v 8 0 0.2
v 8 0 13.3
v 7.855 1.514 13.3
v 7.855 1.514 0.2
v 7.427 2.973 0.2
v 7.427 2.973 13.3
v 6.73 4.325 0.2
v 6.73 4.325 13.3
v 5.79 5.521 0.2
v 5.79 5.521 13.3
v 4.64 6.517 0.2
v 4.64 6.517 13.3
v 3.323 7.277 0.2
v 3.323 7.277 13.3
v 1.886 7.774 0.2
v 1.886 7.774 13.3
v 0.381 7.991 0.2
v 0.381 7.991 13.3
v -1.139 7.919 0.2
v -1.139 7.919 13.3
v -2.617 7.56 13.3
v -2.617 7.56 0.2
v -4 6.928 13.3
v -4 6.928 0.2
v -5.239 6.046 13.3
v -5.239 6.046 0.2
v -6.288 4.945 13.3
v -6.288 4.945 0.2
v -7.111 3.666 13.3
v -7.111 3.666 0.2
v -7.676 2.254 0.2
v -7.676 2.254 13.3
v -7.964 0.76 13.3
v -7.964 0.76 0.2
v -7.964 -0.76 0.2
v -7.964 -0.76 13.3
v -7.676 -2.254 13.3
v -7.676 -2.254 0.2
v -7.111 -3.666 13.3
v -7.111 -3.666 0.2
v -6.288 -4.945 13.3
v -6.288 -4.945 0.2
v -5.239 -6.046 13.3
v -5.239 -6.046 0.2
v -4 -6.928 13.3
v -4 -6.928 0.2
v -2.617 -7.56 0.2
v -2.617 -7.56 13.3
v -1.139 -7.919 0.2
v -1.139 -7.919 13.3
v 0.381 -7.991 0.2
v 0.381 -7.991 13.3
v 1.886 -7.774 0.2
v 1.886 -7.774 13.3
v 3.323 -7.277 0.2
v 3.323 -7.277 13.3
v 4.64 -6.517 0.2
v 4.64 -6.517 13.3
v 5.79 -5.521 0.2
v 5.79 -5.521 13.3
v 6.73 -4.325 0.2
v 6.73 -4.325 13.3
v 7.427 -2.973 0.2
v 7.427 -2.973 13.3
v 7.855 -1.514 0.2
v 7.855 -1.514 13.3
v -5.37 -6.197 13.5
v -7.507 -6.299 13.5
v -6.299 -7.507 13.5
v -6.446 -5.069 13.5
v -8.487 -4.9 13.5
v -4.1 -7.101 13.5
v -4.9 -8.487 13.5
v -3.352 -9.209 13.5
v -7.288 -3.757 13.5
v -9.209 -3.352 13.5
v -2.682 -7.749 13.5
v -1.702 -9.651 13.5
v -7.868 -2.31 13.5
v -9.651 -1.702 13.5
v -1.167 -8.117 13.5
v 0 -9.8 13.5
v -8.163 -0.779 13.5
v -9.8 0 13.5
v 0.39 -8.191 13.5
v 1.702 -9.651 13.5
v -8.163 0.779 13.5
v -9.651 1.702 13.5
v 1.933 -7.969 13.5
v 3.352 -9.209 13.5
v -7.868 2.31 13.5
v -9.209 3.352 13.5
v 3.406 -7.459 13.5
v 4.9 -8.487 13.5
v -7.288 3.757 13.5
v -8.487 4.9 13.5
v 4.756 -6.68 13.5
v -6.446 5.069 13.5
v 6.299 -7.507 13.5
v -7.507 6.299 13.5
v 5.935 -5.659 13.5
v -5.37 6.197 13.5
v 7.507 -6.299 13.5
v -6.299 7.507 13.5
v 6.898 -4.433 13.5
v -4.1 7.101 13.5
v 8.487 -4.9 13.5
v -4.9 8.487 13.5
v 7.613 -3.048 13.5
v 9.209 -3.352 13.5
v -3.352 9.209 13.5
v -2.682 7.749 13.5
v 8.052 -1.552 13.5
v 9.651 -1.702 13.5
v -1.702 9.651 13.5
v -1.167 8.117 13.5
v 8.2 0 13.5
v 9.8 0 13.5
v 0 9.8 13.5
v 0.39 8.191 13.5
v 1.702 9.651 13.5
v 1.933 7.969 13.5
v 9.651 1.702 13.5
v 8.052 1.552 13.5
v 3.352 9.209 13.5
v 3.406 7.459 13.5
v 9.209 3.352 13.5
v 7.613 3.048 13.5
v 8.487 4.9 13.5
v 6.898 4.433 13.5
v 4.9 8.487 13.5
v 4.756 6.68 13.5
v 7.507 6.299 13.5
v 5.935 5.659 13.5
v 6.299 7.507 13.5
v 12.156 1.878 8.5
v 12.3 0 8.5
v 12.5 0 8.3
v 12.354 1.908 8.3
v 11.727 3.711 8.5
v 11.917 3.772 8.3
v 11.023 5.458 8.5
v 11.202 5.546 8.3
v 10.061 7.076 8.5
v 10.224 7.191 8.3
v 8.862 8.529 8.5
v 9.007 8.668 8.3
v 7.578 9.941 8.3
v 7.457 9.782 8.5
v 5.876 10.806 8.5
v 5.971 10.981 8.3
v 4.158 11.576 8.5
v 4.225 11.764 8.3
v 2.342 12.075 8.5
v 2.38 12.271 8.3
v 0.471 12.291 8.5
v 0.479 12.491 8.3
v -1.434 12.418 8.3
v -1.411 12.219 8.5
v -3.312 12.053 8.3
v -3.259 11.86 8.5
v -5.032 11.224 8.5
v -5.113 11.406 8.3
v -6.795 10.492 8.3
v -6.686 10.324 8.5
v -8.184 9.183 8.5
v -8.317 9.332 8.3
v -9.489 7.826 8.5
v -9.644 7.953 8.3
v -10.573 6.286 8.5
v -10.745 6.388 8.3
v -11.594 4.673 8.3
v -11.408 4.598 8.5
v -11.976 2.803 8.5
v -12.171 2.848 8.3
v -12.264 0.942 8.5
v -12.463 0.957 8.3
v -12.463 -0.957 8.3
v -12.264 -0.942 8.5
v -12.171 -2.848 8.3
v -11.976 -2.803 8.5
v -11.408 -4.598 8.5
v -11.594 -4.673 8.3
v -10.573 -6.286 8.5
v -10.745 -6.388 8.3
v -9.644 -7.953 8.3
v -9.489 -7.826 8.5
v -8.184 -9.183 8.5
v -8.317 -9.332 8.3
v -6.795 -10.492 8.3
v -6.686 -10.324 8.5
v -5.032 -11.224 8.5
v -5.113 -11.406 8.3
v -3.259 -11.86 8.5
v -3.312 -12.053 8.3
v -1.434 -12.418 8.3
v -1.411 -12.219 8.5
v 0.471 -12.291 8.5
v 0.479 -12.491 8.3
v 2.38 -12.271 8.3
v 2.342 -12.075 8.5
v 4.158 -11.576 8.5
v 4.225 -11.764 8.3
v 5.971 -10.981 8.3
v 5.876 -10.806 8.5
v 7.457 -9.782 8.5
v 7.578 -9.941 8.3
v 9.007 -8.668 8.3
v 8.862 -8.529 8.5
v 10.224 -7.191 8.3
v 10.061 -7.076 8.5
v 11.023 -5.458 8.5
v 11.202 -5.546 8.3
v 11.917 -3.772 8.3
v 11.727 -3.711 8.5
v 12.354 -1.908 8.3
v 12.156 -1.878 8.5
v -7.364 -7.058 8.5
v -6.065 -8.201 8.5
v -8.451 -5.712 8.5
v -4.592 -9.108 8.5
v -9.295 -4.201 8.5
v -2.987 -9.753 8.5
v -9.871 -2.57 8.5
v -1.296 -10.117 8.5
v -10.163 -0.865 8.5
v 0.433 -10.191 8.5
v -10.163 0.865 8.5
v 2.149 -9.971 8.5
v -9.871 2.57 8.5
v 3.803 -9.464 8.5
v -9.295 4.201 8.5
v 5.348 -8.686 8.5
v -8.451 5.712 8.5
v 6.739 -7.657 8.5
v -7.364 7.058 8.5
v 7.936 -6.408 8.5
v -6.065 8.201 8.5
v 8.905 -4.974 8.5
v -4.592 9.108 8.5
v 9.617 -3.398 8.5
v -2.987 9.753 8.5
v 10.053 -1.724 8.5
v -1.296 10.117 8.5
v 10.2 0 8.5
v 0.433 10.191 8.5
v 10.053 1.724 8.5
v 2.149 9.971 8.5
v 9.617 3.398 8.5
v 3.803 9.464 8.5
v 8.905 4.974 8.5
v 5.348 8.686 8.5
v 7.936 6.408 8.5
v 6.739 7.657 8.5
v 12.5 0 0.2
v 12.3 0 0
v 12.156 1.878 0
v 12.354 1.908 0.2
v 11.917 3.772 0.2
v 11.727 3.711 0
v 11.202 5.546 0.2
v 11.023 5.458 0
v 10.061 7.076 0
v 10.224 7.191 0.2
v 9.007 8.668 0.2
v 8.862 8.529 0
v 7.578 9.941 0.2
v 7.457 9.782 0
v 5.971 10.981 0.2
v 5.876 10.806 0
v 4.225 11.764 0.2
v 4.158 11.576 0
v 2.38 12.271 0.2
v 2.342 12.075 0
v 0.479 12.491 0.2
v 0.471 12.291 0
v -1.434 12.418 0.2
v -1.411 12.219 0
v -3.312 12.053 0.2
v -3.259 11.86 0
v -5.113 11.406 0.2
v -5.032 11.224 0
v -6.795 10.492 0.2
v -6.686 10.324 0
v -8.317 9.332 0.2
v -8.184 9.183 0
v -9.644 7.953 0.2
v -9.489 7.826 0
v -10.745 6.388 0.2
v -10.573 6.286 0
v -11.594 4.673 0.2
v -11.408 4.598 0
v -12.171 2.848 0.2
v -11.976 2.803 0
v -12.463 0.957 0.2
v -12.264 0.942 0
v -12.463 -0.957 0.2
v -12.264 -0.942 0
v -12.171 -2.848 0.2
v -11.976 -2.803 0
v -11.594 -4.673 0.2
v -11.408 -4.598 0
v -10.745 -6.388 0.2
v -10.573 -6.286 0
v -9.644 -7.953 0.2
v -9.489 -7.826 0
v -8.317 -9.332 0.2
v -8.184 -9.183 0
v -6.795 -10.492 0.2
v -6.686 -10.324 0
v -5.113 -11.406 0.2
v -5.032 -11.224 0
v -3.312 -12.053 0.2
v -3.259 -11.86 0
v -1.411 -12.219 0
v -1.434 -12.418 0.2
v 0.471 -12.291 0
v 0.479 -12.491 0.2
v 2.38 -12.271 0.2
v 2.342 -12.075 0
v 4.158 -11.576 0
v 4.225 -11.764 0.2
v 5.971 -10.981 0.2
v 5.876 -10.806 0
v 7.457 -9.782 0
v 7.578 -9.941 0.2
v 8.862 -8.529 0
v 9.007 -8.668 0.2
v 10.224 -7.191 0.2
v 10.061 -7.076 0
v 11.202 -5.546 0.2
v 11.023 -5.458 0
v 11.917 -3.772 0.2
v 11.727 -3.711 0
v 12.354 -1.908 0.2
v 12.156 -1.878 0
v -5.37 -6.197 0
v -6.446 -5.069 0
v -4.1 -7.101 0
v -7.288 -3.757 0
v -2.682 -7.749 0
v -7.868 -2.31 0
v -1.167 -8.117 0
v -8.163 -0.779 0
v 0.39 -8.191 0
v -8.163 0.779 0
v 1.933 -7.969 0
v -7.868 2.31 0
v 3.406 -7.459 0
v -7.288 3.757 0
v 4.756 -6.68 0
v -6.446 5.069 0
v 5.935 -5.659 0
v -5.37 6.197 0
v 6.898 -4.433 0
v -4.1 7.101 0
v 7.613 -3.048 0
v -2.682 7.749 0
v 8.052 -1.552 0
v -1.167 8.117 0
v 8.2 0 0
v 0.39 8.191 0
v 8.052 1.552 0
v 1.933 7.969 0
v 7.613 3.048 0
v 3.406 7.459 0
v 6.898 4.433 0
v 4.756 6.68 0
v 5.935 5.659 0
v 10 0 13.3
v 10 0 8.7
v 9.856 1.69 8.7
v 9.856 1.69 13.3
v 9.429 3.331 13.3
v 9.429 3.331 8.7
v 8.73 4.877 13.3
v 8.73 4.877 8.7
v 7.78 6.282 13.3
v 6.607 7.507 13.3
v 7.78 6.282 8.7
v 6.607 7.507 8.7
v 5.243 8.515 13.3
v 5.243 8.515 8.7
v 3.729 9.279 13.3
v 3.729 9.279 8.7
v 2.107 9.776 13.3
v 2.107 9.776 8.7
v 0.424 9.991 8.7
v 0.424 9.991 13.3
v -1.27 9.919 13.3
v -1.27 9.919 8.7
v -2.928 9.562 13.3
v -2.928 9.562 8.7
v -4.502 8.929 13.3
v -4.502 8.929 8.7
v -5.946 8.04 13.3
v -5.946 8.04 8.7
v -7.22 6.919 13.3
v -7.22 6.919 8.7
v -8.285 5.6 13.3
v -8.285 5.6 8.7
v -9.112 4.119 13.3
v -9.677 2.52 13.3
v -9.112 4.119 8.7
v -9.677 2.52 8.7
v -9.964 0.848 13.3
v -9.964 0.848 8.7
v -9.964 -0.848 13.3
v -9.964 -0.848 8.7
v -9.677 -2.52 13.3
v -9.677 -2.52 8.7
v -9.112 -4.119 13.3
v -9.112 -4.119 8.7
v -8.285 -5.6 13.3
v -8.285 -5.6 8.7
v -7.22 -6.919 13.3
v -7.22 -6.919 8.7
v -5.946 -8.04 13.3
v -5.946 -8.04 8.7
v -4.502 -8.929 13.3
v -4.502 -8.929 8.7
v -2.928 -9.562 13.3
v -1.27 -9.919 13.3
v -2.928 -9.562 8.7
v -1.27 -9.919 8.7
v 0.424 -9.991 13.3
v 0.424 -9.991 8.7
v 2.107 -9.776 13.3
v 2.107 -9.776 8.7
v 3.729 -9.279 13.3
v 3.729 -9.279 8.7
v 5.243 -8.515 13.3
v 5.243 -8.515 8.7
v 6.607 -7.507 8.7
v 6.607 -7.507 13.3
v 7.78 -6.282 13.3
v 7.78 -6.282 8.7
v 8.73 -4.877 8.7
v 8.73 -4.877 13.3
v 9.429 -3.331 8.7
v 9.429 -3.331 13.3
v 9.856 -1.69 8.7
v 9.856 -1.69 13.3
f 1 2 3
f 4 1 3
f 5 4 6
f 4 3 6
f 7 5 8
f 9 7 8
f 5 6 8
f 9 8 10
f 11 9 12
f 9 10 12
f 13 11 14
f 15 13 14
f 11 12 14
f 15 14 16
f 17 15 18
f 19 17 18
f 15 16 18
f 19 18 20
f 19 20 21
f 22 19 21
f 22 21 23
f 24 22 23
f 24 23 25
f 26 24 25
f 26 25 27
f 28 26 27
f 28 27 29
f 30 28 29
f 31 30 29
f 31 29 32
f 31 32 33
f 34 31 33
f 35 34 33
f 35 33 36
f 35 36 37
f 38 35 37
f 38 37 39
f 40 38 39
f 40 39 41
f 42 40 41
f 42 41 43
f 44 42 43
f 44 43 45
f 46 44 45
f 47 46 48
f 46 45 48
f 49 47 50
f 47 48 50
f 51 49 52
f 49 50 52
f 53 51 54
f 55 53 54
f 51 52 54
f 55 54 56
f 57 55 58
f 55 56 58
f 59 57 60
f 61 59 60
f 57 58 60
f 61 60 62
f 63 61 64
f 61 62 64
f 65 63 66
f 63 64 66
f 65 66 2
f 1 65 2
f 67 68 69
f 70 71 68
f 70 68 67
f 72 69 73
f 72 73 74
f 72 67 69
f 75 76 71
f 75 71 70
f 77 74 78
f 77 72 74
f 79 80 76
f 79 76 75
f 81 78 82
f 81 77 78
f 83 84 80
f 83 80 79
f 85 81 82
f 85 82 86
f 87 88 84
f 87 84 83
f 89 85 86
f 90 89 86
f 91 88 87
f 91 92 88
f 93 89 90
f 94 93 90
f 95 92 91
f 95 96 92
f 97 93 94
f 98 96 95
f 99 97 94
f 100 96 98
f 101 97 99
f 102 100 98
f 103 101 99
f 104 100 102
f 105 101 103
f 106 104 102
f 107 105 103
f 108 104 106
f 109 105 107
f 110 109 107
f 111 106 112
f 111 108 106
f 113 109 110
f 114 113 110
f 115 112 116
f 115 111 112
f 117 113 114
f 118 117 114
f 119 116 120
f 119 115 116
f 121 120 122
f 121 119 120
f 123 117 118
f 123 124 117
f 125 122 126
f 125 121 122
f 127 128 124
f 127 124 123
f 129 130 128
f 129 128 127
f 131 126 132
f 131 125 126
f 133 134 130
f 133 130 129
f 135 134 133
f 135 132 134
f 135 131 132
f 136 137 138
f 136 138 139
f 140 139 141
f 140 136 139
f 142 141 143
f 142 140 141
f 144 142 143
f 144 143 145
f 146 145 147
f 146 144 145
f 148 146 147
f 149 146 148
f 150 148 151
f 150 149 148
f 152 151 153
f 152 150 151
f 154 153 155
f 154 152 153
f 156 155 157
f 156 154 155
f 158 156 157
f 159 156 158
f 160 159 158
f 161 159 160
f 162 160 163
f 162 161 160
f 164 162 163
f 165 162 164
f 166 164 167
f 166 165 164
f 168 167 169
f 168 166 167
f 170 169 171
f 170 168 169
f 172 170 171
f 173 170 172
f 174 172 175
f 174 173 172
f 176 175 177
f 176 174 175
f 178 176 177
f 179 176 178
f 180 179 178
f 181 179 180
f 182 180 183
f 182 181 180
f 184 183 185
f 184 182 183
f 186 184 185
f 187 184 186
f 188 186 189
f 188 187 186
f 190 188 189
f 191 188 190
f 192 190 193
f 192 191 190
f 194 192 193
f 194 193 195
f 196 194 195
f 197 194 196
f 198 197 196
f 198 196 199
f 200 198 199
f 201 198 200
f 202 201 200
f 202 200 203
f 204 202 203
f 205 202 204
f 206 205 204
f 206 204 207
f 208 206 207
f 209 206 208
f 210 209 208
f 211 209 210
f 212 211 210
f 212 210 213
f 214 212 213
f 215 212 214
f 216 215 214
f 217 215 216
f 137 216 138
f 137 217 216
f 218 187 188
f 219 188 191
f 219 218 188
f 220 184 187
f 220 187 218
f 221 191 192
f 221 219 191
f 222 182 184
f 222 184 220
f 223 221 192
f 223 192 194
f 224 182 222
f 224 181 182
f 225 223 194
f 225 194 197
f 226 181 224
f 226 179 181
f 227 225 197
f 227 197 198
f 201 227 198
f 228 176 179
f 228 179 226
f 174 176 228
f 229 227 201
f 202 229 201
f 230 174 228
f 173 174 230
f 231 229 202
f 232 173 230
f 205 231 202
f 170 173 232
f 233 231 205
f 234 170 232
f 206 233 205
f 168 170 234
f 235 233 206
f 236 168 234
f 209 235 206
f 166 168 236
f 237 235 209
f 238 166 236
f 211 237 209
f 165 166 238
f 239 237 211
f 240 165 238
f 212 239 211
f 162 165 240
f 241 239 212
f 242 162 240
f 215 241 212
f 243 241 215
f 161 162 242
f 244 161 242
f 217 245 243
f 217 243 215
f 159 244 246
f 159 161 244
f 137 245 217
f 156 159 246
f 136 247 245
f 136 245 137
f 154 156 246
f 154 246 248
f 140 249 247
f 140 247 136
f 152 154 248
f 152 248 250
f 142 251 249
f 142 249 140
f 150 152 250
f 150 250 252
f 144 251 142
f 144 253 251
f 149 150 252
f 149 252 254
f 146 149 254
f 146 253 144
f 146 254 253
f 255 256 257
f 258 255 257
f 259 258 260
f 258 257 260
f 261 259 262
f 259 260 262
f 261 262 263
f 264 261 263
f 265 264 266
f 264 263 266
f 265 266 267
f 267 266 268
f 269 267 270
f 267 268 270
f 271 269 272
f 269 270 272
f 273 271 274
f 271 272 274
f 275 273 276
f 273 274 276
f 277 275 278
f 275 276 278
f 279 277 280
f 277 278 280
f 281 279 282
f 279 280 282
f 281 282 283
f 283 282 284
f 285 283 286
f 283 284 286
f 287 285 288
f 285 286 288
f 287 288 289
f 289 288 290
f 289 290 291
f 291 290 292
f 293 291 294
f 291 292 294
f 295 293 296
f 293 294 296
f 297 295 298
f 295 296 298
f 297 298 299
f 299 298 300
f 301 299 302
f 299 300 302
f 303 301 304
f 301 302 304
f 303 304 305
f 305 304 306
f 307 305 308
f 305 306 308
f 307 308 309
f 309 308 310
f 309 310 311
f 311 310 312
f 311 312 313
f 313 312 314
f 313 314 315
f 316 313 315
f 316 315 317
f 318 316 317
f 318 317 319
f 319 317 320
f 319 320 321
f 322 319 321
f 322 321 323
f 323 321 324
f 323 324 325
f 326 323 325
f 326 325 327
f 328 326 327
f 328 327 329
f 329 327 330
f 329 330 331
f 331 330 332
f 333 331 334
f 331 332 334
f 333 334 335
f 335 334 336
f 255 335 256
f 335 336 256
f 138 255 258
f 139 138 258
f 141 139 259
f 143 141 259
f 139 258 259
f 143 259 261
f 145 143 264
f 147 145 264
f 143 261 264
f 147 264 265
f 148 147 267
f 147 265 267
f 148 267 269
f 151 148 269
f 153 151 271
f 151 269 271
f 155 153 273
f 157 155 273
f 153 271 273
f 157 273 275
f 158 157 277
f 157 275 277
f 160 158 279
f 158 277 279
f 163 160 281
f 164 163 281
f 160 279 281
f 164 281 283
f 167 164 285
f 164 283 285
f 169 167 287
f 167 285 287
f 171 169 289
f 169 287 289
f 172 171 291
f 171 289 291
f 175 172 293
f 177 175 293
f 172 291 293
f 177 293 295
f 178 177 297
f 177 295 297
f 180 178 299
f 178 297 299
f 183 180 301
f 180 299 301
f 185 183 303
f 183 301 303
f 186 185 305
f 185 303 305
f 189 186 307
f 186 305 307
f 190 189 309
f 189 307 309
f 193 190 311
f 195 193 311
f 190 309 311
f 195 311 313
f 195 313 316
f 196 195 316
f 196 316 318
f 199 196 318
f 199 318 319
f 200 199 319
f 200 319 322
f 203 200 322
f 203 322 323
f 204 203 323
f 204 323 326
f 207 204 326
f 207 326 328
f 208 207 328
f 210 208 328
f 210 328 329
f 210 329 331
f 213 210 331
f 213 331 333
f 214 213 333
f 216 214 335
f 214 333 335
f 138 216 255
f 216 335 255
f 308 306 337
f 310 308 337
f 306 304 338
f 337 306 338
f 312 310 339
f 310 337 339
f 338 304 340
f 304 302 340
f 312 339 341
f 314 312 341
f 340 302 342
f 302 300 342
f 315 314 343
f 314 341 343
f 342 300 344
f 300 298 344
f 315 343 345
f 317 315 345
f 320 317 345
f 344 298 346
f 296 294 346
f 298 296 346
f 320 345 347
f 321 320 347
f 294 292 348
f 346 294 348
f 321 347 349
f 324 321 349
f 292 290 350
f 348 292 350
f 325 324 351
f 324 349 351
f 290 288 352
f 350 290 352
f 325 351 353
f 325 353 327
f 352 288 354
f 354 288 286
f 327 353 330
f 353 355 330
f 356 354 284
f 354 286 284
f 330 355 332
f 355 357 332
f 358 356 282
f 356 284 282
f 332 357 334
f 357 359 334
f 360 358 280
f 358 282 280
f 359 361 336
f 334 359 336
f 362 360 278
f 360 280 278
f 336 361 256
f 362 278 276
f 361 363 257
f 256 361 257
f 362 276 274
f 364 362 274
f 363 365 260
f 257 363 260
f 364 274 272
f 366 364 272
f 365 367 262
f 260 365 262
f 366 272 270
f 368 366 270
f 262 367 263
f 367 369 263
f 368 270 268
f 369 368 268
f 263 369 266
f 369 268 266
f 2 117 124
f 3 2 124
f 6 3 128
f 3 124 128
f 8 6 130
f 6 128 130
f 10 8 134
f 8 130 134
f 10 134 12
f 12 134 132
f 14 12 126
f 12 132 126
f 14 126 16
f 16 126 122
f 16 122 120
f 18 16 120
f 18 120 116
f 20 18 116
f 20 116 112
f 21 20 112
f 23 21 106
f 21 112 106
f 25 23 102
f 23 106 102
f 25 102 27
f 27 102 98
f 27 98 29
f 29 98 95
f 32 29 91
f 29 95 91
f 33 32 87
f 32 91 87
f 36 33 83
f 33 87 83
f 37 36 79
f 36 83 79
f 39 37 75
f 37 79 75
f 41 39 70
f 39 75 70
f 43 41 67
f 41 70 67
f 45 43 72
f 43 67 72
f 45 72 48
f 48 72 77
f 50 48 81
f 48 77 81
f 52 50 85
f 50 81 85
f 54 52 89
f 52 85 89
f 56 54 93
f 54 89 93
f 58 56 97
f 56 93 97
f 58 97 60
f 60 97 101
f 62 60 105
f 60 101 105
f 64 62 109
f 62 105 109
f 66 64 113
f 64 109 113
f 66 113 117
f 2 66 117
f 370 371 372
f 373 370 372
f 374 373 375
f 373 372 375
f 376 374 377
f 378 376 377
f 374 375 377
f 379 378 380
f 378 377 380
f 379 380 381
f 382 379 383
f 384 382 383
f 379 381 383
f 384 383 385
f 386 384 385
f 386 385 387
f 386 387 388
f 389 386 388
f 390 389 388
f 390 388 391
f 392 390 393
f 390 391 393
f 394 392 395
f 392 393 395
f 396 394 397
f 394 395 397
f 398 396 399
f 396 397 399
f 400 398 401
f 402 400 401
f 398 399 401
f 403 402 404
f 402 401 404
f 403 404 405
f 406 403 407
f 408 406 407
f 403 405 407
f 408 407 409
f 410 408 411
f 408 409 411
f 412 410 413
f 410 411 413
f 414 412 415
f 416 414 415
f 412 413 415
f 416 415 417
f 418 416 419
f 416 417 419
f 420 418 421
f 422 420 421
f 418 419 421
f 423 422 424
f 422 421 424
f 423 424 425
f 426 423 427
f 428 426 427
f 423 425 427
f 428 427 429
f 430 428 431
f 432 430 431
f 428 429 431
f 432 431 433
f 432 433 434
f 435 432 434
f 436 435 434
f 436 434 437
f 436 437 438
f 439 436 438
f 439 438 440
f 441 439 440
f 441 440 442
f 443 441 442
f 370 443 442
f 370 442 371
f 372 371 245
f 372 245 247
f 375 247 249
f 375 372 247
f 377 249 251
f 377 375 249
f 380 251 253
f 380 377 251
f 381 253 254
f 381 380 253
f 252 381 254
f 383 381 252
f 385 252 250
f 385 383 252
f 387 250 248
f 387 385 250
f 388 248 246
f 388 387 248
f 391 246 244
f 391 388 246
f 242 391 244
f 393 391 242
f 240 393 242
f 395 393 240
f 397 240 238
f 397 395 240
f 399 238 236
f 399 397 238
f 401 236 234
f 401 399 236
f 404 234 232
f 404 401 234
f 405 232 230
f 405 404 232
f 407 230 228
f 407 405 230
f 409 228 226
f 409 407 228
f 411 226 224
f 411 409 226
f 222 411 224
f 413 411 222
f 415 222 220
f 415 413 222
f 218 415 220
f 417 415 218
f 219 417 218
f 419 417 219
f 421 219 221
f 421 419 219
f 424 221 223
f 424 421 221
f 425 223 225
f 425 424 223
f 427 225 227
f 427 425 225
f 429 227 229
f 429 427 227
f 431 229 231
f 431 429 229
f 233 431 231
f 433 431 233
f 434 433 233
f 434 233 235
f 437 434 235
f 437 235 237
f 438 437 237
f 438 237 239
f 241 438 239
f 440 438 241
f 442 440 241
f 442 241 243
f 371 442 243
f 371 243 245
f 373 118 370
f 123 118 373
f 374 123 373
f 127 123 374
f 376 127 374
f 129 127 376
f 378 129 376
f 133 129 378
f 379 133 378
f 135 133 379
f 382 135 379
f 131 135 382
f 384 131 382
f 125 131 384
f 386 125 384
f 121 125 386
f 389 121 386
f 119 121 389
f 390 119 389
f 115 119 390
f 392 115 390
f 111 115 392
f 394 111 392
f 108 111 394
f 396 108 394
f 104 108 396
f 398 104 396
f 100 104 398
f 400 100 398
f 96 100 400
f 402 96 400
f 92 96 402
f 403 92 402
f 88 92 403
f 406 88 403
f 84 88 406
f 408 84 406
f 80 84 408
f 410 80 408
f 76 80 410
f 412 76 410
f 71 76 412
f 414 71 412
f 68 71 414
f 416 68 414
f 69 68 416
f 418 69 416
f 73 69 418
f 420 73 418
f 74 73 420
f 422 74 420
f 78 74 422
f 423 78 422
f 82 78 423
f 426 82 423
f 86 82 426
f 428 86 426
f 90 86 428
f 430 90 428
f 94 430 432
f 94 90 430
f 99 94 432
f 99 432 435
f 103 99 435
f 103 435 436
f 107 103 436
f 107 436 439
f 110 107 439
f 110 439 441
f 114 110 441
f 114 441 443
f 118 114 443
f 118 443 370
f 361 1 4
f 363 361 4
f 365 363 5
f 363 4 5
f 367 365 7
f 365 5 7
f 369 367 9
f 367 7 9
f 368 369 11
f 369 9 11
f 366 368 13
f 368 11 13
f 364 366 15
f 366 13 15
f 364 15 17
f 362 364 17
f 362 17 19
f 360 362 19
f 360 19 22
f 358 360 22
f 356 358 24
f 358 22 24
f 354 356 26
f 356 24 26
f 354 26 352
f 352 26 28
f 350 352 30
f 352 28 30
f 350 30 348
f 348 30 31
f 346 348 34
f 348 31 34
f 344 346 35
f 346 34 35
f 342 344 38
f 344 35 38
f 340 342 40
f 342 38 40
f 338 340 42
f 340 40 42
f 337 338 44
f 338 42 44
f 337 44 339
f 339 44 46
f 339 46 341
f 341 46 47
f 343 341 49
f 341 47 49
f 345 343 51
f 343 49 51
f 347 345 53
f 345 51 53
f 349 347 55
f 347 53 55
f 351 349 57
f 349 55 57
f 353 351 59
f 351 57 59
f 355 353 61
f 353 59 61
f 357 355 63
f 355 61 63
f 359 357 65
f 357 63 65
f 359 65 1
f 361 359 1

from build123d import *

# Parameters (mm, degrees)
F0_R     = 12.5
F1_DEPTH = 8.5
F2_R     = 10
F3_DEPTH = 5
F4_R     = 8
F5_DEPTH = 13.501
F6_SIZE  = 0.2


with BuildPart() as f1:
    # F0 (on Top) → F1 (new body)
    with BuildSketch(Plane.XY):
        Circle(F0_R)
    extrude(amount=F1_DEPTH)

    # F2 (on face) → F3 (join)
    with BuildSketch(Plane.XY.offset(8.5)):
        Circle(F2_R)
    extrude(amount=F3_DEPTH)

    # F4 (on face) → F5 (cut, through all)
    with BuildSketch(Plane.XY.offset(13.5)):
        Circle(F4_R)
    extrude(amount=-F5_DEPTH, mode=Mode.SUBTRACT)

    # F6
    f6_edges = [f1.edges().sort_by_distance(p)[0] for p in [
        (-10, 0, 13.5),
        (-8, 0, 13.5),
        (-12.5, 0, 8.5),
        (-10, 0, 8.5),
        (-12.5, 0, 0),
        (-8, 0, 0),
    ]]
    chamfer(f6_edges, length=F6_SIZE)


solid = f1.part
